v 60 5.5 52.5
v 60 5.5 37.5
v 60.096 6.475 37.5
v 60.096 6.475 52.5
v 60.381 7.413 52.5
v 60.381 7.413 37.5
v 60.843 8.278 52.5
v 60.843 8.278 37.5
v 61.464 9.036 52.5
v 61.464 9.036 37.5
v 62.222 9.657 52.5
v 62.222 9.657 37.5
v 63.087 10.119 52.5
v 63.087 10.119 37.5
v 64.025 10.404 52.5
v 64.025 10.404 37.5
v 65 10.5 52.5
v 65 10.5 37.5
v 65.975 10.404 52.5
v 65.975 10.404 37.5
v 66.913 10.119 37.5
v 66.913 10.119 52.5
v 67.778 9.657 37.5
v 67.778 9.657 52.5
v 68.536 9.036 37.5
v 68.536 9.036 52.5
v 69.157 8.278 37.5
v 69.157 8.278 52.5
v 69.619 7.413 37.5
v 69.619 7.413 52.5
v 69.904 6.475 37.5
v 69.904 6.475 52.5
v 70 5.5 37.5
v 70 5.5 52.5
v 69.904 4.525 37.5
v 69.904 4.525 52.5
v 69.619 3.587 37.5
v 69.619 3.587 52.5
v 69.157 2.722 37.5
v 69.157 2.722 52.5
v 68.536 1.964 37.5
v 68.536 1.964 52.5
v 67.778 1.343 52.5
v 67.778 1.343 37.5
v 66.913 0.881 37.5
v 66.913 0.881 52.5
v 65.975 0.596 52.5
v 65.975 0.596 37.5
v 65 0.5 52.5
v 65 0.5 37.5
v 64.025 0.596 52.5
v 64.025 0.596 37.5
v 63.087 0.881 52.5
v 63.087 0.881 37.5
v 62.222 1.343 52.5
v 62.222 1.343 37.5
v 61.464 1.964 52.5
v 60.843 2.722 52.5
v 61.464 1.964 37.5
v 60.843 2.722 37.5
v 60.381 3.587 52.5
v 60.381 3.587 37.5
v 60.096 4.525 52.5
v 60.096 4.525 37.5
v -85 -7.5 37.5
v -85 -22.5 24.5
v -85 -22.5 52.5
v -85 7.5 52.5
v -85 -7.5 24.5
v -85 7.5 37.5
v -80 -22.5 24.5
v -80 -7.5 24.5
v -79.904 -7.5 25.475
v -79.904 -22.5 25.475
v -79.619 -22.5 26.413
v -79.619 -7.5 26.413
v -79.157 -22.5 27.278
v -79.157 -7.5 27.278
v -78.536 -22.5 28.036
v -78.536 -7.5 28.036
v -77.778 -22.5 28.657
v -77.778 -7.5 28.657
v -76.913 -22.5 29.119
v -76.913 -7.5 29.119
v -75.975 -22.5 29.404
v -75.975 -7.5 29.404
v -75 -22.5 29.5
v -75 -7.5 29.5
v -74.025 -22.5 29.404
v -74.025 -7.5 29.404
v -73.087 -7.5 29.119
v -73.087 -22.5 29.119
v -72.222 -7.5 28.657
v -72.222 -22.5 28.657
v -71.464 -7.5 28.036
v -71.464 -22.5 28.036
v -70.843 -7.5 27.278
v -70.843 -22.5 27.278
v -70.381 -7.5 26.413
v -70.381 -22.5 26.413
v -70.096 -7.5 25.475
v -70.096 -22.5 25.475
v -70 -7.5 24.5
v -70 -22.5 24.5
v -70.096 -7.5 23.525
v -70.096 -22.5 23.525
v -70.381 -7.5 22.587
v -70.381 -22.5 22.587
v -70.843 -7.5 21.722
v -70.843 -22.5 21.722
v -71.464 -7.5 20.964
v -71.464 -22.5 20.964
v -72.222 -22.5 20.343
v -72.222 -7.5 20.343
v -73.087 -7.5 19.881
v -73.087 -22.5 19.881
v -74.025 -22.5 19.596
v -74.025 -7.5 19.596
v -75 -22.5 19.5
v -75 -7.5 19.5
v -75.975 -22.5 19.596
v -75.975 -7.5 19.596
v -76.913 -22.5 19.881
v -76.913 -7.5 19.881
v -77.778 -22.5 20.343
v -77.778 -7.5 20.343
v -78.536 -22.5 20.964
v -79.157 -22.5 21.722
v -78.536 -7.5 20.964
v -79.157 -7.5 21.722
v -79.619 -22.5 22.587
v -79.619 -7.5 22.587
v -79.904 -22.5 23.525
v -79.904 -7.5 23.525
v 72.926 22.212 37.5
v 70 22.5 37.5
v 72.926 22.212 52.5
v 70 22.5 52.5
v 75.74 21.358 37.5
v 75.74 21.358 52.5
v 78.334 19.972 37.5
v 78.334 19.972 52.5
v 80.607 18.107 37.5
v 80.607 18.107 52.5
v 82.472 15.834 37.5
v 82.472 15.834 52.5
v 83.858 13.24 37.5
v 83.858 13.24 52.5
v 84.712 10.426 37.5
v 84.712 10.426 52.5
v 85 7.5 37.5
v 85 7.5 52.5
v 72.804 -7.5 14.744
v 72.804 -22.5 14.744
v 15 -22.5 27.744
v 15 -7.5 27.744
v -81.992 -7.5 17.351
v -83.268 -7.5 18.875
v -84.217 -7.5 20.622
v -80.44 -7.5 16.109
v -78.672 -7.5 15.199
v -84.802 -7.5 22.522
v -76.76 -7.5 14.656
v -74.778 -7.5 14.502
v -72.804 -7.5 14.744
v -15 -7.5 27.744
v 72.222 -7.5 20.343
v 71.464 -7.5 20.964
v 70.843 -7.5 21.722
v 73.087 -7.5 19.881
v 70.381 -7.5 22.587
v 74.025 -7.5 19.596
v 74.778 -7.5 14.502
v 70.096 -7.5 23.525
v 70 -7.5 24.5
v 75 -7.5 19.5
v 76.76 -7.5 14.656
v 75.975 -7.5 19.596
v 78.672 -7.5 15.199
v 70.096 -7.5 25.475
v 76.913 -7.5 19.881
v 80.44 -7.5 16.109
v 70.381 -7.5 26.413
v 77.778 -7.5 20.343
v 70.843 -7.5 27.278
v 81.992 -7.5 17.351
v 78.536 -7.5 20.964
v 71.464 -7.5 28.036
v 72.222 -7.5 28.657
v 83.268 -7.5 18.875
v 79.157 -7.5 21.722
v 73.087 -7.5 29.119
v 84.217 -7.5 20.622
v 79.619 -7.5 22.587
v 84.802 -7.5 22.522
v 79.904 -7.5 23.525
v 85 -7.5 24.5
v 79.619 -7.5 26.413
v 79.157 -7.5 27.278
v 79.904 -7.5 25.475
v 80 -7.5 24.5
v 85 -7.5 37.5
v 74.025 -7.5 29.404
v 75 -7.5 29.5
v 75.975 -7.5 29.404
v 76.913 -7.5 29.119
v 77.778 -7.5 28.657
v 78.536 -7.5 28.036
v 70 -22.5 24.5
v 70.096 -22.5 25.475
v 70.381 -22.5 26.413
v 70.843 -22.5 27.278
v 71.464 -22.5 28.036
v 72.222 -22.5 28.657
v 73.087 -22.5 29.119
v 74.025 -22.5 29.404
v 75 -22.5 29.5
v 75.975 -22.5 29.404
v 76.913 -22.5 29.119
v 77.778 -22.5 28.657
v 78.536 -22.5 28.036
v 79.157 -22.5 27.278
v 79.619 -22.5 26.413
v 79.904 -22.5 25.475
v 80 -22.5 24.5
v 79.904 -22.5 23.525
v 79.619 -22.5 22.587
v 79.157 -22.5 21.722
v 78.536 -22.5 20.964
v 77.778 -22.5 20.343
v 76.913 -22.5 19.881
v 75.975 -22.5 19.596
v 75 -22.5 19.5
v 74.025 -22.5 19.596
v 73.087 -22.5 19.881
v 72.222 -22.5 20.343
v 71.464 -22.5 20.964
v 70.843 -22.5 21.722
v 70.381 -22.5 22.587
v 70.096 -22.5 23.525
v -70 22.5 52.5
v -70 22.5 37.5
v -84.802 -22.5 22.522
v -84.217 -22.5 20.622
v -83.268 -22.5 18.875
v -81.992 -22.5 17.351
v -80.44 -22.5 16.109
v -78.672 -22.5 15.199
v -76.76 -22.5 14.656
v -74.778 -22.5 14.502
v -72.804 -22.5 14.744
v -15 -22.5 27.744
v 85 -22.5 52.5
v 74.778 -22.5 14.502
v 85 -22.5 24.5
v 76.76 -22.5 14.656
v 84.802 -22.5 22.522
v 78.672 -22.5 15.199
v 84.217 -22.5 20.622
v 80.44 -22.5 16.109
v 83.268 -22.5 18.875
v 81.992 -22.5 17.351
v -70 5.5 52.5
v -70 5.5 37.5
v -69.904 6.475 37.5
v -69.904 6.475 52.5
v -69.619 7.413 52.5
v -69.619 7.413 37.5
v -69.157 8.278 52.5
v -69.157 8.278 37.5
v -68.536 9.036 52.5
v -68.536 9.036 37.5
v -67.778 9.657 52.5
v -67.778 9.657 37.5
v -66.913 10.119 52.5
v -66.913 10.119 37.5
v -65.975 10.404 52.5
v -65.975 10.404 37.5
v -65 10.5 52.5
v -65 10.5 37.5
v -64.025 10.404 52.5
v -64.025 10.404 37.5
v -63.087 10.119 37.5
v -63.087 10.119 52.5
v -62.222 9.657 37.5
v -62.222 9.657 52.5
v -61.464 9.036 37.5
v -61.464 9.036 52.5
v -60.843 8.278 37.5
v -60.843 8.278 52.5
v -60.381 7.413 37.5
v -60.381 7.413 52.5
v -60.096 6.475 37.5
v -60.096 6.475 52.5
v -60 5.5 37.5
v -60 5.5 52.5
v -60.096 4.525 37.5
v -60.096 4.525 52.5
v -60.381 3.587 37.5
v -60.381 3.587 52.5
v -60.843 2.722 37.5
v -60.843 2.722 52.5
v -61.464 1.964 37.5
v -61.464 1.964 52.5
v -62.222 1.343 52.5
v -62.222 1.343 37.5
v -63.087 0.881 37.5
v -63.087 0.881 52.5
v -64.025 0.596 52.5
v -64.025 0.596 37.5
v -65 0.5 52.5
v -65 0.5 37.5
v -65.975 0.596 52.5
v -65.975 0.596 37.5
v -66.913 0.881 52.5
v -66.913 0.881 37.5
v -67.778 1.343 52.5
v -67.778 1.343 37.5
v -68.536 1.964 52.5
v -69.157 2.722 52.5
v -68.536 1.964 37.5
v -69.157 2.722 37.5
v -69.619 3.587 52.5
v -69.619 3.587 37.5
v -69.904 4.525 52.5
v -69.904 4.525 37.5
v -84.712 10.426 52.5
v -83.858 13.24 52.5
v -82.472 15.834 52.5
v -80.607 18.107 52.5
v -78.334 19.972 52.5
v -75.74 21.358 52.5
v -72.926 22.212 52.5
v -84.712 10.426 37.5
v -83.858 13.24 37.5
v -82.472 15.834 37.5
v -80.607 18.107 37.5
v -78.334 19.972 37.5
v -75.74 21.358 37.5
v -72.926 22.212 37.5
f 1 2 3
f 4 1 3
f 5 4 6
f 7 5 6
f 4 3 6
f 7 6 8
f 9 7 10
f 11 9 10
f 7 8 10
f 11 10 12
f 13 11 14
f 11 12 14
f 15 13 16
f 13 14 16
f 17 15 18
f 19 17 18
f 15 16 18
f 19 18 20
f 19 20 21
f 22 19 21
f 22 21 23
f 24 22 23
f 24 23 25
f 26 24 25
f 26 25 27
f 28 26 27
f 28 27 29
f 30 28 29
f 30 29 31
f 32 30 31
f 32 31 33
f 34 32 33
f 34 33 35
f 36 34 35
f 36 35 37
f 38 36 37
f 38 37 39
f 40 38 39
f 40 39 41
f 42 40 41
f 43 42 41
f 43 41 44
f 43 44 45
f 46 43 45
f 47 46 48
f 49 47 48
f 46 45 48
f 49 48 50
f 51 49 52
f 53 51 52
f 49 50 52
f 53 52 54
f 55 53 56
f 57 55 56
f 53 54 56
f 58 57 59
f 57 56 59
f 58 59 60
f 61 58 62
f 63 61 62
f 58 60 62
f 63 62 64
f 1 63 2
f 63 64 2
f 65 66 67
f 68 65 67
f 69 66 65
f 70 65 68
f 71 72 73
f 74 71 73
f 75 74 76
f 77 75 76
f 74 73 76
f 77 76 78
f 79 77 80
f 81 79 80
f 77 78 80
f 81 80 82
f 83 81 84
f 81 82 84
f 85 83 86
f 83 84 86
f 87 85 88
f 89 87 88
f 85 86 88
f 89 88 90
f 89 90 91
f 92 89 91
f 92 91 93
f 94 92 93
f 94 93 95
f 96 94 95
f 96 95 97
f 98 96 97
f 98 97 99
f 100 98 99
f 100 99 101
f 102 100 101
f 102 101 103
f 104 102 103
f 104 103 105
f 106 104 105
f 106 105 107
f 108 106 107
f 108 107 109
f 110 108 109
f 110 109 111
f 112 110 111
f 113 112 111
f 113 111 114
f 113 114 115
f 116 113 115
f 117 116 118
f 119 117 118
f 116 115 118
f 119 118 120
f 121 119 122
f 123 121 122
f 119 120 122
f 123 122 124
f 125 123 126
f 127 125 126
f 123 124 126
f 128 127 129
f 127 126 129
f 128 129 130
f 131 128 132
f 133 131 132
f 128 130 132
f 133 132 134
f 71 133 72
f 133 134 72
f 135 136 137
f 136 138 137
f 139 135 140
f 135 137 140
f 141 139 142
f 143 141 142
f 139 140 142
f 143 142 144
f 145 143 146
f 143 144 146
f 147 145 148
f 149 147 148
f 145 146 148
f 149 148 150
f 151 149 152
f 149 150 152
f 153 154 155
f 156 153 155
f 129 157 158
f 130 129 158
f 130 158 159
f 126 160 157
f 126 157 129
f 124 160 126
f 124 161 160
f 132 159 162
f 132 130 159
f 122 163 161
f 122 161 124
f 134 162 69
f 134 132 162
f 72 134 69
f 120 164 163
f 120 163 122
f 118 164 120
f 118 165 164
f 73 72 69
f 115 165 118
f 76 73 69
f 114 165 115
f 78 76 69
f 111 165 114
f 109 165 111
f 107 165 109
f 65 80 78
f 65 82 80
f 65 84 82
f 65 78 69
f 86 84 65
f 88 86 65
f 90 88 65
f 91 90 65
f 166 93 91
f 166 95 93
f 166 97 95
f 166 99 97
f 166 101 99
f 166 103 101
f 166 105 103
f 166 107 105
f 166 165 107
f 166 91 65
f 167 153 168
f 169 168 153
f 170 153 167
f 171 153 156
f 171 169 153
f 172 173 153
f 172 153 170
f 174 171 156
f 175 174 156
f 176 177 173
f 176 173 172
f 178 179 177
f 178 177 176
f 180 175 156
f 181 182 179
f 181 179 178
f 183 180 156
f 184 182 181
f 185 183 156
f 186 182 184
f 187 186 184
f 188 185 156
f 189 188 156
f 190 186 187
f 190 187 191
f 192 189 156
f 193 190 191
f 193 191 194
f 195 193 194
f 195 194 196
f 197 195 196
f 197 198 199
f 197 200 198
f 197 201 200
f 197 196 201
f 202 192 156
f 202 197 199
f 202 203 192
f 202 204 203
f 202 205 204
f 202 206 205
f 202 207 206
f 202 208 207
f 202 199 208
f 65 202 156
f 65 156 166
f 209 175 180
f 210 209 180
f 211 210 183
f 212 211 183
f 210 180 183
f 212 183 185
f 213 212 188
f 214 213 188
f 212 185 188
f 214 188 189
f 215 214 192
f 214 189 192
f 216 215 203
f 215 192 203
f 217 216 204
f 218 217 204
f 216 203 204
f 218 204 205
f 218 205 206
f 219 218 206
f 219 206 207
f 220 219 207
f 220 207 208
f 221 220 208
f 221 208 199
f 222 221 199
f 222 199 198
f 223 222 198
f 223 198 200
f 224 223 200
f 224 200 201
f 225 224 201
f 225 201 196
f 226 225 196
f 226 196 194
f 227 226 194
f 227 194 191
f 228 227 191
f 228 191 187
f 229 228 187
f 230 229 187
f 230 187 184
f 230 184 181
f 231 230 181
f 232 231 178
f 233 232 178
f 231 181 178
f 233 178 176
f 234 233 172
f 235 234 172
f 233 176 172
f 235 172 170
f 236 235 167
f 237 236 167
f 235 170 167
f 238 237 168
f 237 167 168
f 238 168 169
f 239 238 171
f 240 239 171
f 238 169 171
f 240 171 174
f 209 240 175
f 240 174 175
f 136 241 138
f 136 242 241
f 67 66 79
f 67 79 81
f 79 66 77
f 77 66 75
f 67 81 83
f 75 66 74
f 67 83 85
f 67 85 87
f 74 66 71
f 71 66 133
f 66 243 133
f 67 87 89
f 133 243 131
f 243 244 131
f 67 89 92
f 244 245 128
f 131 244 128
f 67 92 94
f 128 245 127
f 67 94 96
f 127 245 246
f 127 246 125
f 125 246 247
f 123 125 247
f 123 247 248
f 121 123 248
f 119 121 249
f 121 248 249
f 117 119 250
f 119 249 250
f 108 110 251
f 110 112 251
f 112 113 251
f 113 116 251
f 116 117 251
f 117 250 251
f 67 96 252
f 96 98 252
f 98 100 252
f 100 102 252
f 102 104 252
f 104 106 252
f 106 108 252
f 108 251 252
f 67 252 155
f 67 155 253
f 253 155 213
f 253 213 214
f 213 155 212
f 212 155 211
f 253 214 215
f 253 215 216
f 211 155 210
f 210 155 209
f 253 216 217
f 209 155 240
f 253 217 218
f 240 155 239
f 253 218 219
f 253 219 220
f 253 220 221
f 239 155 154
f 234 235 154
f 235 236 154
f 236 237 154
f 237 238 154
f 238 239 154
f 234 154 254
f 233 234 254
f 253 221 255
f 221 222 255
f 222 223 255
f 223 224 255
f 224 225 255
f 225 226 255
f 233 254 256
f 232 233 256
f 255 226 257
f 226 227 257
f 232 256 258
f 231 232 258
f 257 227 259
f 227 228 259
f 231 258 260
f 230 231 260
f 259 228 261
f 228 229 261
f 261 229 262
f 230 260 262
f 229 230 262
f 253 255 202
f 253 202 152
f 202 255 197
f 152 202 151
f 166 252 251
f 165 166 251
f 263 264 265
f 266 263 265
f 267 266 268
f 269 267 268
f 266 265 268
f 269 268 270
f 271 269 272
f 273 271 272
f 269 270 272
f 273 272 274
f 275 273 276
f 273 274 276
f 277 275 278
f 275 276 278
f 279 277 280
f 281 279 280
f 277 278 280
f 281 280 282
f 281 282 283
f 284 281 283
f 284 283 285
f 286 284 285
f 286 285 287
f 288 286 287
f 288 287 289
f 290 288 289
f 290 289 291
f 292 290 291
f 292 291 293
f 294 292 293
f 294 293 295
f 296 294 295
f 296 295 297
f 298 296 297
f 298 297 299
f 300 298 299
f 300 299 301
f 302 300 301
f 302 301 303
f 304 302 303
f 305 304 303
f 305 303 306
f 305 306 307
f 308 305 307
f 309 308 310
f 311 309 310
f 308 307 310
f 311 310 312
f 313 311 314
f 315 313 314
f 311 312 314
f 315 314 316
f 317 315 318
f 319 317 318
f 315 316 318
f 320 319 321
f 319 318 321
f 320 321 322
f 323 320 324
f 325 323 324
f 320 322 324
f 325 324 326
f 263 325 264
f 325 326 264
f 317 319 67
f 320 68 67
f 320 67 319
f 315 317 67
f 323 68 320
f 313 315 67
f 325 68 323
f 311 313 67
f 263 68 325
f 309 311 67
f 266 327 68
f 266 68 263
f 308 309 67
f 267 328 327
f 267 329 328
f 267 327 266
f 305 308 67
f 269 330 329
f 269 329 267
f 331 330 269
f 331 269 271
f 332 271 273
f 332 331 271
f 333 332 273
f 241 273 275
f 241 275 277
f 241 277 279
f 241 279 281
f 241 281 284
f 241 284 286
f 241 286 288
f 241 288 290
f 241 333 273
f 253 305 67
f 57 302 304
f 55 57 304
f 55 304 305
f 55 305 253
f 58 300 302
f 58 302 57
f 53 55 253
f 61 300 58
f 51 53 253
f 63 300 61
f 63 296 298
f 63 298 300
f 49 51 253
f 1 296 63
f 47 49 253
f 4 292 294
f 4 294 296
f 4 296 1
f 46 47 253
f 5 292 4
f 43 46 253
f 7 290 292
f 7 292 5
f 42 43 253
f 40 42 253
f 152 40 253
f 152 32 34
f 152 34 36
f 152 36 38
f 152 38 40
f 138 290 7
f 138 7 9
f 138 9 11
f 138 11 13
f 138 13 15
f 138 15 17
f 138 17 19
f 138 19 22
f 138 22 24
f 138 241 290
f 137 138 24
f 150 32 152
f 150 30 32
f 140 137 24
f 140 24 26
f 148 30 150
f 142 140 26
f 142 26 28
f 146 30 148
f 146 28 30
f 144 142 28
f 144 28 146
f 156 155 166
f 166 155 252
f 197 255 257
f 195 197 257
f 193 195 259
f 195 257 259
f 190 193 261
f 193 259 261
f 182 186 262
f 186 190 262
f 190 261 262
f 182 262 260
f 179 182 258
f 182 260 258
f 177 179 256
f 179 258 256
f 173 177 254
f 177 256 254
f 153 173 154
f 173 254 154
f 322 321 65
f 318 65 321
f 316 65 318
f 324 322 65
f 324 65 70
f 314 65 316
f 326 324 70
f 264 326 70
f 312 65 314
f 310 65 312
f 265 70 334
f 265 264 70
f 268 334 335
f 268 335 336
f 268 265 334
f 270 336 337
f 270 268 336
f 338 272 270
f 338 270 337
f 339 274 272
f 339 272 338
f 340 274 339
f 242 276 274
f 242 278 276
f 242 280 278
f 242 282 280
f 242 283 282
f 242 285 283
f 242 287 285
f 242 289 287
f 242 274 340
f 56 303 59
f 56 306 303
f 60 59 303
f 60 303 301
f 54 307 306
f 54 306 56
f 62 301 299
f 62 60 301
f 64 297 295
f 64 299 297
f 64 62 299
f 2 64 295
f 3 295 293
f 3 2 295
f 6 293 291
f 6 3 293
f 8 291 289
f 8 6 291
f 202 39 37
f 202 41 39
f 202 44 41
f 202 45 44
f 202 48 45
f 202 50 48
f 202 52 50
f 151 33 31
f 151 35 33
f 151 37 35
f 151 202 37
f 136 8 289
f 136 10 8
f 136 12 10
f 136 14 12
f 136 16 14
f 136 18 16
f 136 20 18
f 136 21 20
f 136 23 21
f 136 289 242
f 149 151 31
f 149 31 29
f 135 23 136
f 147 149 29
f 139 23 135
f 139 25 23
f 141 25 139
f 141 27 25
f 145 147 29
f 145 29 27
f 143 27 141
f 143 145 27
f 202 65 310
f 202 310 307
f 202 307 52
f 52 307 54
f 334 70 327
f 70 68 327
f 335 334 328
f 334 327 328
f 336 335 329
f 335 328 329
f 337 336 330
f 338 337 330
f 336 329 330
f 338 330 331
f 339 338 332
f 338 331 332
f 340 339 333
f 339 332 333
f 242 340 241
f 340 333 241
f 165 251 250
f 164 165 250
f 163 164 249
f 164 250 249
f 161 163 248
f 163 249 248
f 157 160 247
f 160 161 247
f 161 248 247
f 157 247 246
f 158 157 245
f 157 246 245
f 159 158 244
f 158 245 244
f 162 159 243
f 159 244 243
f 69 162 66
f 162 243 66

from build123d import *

# Parameters (mm, degrees)
F0_W      = 170
F0_H      = 45
F1_DEPTH  = 52.5
F3_D      = 10
F5_DEPTH  = 45.001
F6_W      = 30
F6_H      = 37.5
F7_DEPTH  = 170.001
F9_D      = 10
F11_DEPTH = 45.001
F12_R     = 15
F14_DEPTH = 15
F16_DEPTH = 25


with BuildPart() as f1:
    # F0 (on Top) → F1 (new body)
    with BuildSketch(Plane.XY):
        Rectangle(F0_W, F0_H)
    extrude(amount=F1_DEPTH)

    # F3 (through all)
    with Locations(Plane.XY.offset(52.5)):
        with Locations((-65, 5.5), (65, 5.5)):
            Hole(F3_D / 2)

    # F4 (on face) → F5 (cut, through all)
    with BuildSketch(Plane.XZ.offset(22.5)):
        with BuildLine():
            Line((-85, 0), (85, 0))
            ThreePointArc((85, 0), (0, 27.5), (-85, 0))
        make_face()
    extrude(amount=-F5_DEPTH, mode=Mode.SUBTRACT)

    # F6 (on face) → F7 (cut, through all)
    with BuildSketch(Plane.YZ.offset(85)):
        with Locations((7.5, 18.75)):
            Rectangle(F6_W, F6_H)
    extrude(amount=-F7_DEPTH, mode=Mode.SUBTRACT)

    # F9 (through all)
    with Locations(Plane.XZ.offset(22.5)):
        with Locations((-75, 24.5), (75, 24.5)):
            Hole(F9_D / 2)

    # F10 (on face) → F11 (cut, through all)
    with BuildSketch(Plane.XZ.offset(22.5)):
        with BuildLine():
            ThreePointArc((85, 24.5), (81.246693, 16.691106), (72.804234, 14.744047))
            Line((72.804234, 14.744047), (31.863562, 23.958539))
            Line((31.863562, 23.958539), (85, 0))
            Line((85, 0), (85, 24.5))
        make_face()
        with BuildLine():
            ThreePointArc((-72.804234, 14.744047), (-81.246693, 16.691106), (-85, 24.5))
            Line((-85, 24.5), (-85, 0))
            Line((-85, 0), (-31.863562, 23.958539))
            Line((-31.863562, 23.958539), (-72.804234, 14.744047))
        make_face()
    extrude(amount=-F11_DEPTH, mode=Mode.SUBTRACT)

    # F12
    f12_edges = [f1.edges().sort_by_distance(p)[0] for p in [
        (85, 22.5, 45),
        (-85, 22.5, 45),
    ]]
    fillet(f12_edges, radius=F12_R)

    # F13 (on face) → F14 (join, through all)
    with BuildSketch(Plane.XZ.offset(22.5)):
        Polygon((-48.969162, 34.744047), (-72.804234, 14.744047), (72.804234, 14.744047), (48.969162, 34.744047), align=None)
    extrude(amount=-F14_DEPTH)

    # F15 (on face) → F16 (cut)
    with BuildSketch(Plane.XZ.offset(22.5)):
        Polygon((-15, 27.744047), (-72.804234, 14.744047), (72.804234, 14.744047), (15, 27.744047), align=None)
    extrude(amount=-F16_DEPTH, mode=Mode.SUBTRACT)


solid = f1.part
